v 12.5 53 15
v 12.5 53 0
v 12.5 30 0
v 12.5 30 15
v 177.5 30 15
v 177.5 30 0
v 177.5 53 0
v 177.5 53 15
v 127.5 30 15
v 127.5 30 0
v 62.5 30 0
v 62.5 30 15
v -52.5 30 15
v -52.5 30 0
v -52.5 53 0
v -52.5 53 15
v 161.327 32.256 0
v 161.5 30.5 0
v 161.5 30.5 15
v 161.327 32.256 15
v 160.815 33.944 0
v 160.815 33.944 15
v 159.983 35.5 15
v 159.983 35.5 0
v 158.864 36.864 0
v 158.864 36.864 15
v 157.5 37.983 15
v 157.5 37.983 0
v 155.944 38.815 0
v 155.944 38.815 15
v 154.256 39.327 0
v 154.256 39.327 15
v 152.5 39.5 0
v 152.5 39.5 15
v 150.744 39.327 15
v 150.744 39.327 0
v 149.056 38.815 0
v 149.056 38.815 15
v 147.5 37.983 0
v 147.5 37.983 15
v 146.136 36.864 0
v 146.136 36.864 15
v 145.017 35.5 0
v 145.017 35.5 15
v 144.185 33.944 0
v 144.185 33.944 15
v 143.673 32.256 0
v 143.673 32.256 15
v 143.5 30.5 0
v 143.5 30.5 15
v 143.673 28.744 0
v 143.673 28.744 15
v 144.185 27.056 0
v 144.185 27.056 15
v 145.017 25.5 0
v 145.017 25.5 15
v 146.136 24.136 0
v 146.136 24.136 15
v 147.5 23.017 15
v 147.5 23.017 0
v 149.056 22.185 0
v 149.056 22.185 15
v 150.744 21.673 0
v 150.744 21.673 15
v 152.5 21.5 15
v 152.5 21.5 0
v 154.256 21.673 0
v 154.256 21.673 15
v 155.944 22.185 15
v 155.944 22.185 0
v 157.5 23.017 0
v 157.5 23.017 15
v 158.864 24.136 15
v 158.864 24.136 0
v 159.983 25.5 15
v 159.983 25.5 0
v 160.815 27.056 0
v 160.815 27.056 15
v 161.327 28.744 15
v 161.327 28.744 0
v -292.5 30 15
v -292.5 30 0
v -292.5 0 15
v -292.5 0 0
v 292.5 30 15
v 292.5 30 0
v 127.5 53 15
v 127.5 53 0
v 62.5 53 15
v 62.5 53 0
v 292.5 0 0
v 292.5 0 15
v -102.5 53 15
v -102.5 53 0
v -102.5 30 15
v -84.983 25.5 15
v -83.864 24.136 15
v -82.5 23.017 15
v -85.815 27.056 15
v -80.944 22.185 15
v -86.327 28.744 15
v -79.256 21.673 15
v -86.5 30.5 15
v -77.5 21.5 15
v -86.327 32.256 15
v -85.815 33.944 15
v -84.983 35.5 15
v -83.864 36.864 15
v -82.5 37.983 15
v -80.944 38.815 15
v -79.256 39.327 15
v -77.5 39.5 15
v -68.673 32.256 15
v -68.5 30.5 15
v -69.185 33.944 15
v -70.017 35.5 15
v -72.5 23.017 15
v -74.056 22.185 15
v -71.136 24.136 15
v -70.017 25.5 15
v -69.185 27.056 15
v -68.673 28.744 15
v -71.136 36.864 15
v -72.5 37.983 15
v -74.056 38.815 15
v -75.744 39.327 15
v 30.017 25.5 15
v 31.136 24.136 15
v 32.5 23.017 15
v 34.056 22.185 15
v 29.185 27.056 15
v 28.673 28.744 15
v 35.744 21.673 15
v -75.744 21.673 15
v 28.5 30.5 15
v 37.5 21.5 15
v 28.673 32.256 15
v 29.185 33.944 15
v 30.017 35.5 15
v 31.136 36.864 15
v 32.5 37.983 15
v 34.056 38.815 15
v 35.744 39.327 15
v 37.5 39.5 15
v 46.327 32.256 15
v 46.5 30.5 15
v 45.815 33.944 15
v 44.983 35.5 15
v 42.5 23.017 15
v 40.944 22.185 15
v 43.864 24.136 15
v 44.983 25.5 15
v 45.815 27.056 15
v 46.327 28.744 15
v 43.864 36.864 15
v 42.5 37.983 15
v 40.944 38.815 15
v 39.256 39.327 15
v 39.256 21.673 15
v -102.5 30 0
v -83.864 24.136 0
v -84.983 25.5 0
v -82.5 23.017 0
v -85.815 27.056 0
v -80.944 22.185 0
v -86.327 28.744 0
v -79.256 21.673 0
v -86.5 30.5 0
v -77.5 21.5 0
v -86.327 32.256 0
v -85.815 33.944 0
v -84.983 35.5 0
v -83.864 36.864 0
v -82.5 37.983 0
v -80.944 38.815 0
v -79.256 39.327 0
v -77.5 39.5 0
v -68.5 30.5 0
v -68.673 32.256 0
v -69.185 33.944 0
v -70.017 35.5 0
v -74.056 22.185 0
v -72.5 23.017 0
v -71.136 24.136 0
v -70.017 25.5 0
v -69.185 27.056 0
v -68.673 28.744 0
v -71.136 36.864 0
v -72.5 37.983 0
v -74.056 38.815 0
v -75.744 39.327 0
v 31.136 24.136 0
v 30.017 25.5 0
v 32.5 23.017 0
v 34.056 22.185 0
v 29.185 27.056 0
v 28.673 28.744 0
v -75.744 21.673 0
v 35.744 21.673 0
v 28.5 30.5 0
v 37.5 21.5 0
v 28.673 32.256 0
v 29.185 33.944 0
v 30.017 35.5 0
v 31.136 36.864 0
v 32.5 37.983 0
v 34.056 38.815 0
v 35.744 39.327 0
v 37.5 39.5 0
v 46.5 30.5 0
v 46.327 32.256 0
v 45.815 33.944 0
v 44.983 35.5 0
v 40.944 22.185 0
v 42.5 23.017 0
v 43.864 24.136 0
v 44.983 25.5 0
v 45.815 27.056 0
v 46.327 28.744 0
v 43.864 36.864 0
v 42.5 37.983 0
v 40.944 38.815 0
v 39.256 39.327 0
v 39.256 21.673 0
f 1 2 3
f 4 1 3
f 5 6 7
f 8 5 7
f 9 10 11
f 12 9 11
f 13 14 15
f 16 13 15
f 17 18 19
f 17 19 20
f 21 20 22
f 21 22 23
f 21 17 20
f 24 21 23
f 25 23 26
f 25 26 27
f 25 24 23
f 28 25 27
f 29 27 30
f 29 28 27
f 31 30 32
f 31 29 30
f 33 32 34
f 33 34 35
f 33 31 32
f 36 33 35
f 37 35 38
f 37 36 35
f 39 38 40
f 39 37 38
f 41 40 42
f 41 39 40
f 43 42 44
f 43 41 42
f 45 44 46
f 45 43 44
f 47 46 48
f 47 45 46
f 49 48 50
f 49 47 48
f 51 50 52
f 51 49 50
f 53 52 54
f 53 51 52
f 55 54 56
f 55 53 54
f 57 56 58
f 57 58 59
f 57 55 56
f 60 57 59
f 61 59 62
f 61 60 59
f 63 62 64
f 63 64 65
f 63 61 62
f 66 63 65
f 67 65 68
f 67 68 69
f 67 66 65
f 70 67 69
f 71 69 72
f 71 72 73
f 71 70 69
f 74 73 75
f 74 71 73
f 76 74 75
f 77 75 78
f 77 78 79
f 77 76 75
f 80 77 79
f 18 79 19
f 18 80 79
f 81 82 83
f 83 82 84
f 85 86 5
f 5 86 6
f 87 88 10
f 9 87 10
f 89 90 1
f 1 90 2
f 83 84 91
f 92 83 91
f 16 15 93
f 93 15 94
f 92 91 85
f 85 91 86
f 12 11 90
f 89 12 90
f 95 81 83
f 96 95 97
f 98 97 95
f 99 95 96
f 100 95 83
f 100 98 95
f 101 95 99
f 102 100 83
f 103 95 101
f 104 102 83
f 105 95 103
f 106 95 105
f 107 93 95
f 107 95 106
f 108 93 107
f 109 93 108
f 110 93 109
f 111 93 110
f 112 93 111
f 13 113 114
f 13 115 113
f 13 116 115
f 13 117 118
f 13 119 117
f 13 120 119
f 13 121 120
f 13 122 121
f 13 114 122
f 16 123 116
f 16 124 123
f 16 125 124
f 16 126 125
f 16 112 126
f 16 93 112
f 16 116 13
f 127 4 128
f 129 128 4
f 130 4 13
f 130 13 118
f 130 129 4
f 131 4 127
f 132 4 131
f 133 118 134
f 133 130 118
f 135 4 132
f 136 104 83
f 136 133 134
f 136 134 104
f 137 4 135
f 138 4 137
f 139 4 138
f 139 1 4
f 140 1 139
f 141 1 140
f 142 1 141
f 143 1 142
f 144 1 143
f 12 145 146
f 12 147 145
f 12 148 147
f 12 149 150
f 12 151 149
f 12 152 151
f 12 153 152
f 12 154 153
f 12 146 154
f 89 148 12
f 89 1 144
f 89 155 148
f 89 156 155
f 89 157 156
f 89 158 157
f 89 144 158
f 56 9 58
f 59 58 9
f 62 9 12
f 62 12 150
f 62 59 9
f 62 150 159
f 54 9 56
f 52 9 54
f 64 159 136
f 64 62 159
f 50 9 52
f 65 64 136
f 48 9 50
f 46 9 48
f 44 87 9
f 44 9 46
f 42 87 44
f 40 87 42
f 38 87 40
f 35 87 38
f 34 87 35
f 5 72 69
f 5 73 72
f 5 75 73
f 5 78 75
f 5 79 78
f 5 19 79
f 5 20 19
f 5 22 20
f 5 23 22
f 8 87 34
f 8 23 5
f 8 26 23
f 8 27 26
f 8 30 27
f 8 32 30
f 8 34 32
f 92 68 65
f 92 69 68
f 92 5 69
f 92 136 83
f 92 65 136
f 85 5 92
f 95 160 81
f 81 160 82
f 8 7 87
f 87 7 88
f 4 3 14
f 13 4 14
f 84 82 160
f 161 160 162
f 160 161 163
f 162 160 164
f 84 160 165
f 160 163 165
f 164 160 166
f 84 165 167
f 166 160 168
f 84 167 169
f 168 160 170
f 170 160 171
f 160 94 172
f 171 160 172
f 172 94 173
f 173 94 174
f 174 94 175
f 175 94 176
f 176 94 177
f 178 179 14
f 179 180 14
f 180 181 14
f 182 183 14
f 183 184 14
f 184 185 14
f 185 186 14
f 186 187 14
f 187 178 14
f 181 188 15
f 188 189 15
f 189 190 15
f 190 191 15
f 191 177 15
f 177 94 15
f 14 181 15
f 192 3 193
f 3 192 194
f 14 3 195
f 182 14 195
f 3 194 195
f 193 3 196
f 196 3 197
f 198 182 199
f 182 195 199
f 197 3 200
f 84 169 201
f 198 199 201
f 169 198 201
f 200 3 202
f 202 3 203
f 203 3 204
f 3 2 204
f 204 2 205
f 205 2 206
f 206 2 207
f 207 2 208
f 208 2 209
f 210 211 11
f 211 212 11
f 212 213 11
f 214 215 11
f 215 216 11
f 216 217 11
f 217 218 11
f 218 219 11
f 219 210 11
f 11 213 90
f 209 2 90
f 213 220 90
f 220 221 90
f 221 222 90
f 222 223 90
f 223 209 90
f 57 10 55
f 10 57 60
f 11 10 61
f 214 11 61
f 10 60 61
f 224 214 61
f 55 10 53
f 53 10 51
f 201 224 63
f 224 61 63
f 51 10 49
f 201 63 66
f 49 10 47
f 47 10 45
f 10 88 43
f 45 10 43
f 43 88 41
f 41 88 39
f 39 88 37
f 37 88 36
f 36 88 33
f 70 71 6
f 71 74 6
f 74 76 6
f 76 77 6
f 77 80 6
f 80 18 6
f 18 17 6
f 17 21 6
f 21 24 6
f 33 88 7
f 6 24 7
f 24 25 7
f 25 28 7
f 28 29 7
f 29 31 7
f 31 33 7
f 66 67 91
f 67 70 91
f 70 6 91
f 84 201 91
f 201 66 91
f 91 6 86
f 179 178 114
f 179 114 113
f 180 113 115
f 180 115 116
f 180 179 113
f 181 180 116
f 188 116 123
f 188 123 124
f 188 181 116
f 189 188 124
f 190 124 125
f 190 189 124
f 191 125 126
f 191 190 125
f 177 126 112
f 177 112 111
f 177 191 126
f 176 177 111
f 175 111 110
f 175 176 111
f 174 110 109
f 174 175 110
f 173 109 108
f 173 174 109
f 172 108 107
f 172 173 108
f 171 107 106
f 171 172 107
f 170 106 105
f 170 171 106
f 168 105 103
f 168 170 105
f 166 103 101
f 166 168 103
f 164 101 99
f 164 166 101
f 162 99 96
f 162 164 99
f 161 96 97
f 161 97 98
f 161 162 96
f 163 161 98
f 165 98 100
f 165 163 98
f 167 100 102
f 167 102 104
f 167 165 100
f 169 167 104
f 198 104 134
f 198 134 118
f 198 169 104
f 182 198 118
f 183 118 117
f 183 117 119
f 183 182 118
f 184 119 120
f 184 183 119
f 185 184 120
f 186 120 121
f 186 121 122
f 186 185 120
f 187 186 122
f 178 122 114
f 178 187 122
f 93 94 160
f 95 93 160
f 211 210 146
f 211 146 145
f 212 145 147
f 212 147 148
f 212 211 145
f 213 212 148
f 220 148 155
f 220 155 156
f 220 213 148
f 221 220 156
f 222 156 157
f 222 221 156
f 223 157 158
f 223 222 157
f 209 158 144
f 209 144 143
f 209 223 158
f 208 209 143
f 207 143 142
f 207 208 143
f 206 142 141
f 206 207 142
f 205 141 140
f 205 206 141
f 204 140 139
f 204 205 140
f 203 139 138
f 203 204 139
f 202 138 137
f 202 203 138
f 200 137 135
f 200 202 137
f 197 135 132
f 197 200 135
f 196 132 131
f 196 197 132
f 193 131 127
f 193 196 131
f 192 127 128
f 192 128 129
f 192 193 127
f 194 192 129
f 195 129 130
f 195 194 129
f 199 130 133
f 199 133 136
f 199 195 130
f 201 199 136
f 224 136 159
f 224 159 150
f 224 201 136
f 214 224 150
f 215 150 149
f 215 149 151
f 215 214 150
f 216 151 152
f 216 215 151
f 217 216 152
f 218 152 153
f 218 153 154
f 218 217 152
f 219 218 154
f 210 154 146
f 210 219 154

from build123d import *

# Parameters (mm, degrees)
CROQUIS1_R              = 9
SALIENTE_EXTRUIR1_DEPTH = 15


with BuildPart() as part:
    # Croquis1 → Saliente-Extruir1 (new body)
    with BuildSketch(Plane.XY):
        Polygon((-292.5, 0), (292.5, 0), (292.5, 30), (177.5, 30), (177.5, 53), (127.5, 53), (127.5, 30), (62.5, 30), (62.5, 53), (12.5, 53), (12.5, 30), (-52.5, 30), (-52.5, 53), (-102.5, 53), (-102.5, 30), (-292.5, 30), align=None)
        with Locations((37.5, 30.5)):
            Circle(CROQUIS1_R, mode=Mode.SUBTRACT)
        with Locations((-77.5, 30.5)):
            Circle(CROQUIS1_R, mode=Mode.SUBTRACT)
        with Locations((152.5, 30.5)):
            Circle(CROQUIS1_R, mode=Mode.SUBTRACT)
    extrude(amount=SALIENTE_EXTRUIR1_DEPTH)


solid = part.part
